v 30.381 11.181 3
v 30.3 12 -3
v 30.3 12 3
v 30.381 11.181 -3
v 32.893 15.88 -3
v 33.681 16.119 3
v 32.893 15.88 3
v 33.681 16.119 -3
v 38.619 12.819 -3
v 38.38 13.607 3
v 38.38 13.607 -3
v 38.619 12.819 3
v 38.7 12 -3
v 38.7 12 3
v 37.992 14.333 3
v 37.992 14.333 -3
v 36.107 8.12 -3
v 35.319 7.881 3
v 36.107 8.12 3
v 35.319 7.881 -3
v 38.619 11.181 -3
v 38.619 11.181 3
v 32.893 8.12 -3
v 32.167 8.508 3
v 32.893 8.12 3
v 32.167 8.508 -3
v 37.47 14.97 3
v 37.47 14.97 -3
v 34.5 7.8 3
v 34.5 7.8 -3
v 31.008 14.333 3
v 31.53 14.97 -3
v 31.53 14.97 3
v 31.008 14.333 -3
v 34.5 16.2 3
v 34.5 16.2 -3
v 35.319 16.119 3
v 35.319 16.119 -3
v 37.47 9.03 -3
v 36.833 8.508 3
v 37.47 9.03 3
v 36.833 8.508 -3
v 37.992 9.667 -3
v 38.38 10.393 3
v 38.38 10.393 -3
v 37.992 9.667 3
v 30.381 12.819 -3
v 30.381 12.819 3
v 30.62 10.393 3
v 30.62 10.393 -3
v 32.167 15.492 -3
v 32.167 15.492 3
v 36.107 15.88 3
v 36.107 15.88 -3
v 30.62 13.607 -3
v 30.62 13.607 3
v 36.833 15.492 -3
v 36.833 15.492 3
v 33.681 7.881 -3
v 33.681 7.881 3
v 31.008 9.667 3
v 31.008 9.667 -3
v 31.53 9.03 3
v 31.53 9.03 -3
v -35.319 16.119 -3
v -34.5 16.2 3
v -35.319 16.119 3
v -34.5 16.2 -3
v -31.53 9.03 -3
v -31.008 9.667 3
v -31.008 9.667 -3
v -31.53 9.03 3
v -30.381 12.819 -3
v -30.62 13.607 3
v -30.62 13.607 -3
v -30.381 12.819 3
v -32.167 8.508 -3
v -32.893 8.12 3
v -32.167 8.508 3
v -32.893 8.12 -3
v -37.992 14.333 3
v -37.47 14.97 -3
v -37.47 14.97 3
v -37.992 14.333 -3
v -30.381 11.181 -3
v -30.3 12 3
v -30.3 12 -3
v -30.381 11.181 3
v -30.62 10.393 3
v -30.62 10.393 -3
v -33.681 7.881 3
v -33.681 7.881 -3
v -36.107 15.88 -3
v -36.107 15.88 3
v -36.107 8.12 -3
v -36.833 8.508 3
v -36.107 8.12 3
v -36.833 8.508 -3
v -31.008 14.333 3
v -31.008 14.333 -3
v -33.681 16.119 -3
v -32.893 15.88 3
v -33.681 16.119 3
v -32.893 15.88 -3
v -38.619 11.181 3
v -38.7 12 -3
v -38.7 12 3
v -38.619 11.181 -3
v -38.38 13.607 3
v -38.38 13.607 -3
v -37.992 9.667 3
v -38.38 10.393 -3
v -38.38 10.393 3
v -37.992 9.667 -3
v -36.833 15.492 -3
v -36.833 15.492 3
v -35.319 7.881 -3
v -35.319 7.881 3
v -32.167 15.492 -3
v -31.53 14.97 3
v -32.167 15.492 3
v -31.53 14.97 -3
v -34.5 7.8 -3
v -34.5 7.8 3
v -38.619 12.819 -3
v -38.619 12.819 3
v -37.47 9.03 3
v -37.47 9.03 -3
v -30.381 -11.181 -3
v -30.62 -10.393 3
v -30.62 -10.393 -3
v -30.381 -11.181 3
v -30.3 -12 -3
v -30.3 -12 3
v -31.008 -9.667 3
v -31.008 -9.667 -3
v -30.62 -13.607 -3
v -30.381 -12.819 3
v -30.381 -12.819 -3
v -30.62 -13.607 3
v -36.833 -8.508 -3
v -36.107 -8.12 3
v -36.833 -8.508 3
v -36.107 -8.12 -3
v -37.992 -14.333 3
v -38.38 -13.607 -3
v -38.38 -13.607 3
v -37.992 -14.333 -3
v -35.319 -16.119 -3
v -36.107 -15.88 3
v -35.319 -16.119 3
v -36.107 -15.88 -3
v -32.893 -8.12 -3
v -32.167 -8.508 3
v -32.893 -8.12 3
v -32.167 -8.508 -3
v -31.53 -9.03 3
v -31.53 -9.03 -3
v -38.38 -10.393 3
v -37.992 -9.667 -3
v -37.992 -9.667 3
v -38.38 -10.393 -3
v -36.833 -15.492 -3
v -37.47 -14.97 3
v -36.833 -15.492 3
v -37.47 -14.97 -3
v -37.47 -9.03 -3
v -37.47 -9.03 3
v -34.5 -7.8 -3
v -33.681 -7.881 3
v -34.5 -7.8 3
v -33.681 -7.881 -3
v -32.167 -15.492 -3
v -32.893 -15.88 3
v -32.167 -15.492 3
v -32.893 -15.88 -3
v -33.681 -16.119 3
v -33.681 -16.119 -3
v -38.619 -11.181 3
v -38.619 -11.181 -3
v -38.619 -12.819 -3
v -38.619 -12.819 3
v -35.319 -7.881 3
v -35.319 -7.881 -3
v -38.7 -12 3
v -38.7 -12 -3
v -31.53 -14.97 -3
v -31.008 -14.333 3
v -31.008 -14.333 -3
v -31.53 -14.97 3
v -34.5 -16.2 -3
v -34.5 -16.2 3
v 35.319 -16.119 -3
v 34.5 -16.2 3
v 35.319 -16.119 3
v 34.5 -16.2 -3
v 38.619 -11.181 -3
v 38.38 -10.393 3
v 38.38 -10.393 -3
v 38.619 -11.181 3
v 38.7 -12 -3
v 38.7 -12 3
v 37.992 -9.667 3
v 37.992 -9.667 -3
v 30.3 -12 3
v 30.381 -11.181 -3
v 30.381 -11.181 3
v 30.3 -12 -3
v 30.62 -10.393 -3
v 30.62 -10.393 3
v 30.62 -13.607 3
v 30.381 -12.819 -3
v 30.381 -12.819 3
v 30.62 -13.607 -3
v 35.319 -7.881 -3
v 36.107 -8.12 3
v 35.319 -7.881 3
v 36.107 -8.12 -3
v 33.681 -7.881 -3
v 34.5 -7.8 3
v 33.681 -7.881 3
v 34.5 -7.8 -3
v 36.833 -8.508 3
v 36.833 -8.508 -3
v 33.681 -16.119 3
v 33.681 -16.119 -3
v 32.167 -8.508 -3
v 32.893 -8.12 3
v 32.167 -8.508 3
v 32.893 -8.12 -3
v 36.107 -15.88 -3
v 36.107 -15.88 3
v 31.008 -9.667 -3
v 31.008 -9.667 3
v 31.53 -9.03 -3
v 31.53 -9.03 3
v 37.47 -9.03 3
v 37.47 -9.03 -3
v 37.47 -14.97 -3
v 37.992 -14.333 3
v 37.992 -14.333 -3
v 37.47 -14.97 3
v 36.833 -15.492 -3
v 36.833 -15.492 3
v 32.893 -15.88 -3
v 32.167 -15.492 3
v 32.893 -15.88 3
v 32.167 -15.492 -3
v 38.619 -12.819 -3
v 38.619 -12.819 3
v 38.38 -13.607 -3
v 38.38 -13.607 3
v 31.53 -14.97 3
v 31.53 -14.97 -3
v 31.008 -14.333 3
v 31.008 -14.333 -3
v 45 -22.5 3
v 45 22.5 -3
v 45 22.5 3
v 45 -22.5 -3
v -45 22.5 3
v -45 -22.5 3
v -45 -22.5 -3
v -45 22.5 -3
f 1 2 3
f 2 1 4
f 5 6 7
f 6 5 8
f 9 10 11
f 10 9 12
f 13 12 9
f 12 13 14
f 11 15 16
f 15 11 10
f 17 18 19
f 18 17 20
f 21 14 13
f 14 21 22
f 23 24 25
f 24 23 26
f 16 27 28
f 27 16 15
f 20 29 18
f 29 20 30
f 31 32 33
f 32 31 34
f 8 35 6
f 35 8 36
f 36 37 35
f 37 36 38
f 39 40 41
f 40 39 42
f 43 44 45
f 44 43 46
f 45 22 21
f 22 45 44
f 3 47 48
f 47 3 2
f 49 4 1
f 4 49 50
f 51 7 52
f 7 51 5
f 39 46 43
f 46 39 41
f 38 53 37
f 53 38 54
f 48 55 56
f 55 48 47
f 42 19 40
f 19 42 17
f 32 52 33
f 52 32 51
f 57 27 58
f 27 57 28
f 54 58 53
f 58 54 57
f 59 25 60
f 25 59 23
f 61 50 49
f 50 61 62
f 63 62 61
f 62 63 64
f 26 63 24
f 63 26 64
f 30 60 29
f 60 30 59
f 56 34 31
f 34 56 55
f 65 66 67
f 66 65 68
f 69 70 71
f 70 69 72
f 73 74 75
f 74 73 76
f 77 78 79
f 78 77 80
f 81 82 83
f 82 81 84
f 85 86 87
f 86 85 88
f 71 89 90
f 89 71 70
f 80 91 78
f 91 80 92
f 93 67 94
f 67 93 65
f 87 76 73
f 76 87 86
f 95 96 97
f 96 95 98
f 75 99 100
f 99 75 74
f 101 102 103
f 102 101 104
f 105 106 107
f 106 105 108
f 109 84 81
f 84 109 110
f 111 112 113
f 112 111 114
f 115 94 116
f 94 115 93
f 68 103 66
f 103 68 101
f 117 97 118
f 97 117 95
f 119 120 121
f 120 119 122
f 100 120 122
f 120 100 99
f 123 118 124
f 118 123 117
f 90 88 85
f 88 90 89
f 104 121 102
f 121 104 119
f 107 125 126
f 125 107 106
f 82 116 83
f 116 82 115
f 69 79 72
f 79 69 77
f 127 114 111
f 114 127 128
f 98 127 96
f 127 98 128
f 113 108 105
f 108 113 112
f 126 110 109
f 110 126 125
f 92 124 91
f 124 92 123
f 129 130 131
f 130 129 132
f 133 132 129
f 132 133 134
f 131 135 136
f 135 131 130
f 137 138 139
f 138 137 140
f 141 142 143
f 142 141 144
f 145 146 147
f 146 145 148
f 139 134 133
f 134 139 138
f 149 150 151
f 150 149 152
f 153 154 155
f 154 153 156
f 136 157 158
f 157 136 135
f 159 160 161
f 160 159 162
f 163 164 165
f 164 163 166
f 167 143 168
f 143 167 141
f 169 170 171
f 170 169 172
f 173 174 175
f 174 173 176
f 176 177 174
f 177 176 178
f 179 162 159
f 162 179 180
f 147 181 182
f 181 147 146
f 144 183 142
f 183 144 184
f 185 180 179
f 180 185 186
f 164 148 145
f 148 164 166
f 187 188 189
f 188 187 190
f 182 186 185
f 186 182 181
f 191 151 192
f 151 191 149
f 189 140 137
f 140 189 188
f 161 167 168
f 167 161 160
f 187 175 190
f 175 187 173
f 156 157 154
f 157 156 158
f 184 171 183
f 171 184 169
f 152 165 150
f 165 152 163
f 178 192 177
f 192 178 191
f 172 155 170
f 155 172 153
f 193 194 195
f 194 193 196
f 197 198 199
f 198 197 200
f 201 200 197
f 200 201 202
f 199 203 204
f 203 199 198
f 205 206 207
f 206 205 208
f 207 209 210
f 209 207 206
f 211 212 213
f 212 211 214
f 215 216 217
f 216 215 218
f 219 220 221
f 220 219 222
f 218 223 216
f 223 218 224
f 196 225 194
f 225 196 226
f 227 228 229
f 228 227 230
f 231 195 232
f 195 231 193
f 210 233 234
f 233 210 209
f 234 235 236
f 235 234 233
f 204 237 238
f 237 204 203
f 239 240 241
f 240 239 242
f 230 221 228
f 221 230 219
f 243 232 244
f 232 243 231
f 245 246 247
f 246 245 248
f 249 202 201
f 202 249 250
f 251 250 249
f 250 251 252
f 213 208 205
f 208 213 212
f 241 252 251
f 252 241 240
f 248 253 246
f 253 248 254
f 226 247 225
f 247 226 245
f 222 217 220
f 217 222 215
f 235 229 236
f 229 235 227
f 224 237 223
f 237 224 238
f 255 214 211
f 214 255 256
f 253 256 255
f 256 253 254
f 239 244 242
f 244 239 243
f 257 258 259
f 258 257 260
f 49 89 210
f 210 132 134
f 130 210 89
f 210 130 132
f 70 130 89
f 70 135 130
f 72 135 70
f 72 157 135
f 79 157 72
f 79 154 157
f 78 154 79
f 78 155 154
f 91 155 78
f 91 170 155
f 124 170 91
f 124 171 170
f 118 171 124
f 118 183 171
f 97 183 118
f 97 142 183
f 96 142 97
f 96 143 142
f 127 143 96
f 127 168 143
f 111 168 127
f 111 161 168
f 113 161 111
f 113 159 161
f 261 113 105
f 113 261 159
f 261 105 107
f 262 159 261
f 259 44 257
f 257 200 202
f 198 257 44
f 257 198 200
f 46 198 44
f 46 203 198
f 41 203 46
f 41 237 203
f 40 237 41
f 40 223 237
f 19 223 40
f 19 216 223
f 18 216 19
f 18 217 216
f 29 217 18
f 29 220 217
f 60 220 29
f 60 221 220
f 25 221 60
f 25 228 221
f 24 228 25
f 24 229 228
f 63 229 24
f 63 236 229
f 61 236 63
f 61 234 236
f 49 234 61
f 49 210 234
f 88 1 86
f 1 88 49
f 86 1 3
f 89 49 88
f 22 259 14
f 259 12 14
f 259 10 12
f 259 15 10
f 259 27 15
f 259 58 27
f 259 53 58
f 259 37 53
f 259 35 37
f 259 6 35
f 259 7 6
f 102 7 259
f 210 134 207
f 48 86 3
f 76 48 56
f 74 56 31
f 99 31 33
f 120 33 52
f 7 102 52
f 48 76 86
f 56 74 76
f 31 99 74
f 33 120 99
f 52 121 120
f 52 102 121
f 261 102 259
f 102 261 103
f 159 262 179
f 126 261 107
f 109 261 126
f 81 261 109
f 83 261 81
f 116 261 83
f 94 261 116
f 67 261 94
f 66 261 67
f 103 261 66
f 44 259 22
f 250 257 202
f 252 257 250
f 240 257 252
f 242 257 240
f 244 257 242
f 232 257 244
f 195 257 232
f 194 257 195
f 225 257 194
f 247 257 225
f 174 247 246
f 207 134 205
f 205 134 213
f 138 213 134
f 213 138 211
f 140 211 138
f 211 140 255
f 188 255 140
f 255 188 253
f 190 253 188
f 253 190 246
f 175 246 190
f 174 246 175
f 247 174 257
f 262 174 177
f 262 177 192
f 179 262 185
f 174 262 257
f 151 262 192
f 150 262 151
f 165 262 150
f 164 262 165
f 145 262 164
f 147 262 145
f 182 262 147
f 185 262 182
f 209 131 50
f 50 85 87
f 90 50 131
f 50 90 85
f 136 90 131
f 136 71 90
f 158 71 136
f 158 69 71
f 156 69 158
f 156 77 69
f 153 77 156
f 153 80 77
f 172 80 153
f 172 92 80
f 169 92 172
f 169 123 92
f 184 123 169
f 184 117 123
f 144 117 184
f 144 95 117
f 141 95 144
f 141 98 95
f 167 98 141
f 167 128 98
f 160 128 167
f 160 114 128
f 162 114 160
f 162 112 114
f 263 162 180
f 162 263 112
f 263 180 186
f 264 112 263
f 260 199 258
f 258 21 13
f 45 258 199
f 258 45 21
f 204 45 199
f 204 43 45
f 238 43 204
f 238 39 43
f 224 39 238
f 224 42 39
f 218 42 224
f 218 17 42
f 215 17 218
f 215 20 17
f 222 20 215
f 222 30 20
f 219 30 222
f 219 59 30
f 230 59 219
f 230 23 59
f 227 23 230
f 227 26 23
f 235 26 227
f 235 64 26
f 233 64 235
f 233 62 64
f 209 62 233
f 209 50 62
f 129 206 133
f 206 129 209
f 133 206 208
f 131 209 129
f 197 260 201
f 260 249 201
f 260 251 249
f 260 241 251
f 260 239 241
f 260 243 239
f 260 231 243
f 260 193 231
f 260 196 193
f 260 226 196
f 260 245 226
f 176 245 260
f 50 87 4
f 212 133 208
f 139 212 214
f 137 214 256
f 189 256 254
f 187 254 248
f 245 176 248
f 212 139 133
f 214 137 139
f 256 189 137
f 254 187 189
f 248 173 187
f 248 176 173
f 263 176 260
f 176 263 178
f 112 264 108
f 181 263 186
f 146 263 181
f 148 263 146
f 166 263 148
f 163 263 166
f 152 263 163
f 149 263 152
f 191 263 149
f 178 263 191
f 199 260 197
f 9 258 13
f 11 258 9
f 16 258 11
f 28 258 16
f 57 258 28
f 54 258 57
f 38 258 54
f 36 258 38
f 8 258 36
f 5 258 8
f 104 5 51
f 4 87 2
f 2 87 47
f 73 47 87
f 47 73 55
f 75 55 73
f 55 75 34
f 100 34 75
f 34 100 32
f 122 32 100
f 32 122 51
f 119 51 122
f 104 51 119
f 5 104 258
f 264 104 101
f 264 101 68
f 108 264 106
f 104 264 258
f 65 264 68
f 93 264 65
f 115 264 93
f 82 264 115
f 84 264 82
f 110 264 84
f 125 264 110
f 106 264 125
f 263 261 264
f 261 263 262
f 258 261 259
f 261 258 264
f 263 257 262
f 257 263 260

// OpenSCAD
$fn = 32;

// ----------------------------------------------------------------------
// Corner plate 90 x 45 x 6
// 4 holes, centres taken from the edge offset
// ----------------------------------------------------------------------

// --- parameters (mm) ---
plate = [90, 45, 6];  // overall size (x, y, z)
holes = 4;            // number of holes the drawing asks for
hole_d = 8.4;         // hole diameter
edge = 10.5;          // hole centre offset from the plate edge

// --- derived feature positions (mm) ---
corner_x = plate[0] / 2 - edge;  // = 34.5   corner hole X
corner_y = plate[1] / 2 - edge;  // = 12   corner hole Y
feature_centers = [
  [corner_x, corner_y],
  [-corner_x, corner_y],
  [-corner_x, -corner_y],
  [corner_x, -corner_y]
];   // hole centres the loop below drills

// plate outline, every hole drilled through with the same cutters
difference() {
  cube(plate, center = true);
  for (centre = feature_centers)
    translate([centre[0], centre[1], 0])
      cylinder(d = hole_d, h = plate[2] + 2, center = true);
}
